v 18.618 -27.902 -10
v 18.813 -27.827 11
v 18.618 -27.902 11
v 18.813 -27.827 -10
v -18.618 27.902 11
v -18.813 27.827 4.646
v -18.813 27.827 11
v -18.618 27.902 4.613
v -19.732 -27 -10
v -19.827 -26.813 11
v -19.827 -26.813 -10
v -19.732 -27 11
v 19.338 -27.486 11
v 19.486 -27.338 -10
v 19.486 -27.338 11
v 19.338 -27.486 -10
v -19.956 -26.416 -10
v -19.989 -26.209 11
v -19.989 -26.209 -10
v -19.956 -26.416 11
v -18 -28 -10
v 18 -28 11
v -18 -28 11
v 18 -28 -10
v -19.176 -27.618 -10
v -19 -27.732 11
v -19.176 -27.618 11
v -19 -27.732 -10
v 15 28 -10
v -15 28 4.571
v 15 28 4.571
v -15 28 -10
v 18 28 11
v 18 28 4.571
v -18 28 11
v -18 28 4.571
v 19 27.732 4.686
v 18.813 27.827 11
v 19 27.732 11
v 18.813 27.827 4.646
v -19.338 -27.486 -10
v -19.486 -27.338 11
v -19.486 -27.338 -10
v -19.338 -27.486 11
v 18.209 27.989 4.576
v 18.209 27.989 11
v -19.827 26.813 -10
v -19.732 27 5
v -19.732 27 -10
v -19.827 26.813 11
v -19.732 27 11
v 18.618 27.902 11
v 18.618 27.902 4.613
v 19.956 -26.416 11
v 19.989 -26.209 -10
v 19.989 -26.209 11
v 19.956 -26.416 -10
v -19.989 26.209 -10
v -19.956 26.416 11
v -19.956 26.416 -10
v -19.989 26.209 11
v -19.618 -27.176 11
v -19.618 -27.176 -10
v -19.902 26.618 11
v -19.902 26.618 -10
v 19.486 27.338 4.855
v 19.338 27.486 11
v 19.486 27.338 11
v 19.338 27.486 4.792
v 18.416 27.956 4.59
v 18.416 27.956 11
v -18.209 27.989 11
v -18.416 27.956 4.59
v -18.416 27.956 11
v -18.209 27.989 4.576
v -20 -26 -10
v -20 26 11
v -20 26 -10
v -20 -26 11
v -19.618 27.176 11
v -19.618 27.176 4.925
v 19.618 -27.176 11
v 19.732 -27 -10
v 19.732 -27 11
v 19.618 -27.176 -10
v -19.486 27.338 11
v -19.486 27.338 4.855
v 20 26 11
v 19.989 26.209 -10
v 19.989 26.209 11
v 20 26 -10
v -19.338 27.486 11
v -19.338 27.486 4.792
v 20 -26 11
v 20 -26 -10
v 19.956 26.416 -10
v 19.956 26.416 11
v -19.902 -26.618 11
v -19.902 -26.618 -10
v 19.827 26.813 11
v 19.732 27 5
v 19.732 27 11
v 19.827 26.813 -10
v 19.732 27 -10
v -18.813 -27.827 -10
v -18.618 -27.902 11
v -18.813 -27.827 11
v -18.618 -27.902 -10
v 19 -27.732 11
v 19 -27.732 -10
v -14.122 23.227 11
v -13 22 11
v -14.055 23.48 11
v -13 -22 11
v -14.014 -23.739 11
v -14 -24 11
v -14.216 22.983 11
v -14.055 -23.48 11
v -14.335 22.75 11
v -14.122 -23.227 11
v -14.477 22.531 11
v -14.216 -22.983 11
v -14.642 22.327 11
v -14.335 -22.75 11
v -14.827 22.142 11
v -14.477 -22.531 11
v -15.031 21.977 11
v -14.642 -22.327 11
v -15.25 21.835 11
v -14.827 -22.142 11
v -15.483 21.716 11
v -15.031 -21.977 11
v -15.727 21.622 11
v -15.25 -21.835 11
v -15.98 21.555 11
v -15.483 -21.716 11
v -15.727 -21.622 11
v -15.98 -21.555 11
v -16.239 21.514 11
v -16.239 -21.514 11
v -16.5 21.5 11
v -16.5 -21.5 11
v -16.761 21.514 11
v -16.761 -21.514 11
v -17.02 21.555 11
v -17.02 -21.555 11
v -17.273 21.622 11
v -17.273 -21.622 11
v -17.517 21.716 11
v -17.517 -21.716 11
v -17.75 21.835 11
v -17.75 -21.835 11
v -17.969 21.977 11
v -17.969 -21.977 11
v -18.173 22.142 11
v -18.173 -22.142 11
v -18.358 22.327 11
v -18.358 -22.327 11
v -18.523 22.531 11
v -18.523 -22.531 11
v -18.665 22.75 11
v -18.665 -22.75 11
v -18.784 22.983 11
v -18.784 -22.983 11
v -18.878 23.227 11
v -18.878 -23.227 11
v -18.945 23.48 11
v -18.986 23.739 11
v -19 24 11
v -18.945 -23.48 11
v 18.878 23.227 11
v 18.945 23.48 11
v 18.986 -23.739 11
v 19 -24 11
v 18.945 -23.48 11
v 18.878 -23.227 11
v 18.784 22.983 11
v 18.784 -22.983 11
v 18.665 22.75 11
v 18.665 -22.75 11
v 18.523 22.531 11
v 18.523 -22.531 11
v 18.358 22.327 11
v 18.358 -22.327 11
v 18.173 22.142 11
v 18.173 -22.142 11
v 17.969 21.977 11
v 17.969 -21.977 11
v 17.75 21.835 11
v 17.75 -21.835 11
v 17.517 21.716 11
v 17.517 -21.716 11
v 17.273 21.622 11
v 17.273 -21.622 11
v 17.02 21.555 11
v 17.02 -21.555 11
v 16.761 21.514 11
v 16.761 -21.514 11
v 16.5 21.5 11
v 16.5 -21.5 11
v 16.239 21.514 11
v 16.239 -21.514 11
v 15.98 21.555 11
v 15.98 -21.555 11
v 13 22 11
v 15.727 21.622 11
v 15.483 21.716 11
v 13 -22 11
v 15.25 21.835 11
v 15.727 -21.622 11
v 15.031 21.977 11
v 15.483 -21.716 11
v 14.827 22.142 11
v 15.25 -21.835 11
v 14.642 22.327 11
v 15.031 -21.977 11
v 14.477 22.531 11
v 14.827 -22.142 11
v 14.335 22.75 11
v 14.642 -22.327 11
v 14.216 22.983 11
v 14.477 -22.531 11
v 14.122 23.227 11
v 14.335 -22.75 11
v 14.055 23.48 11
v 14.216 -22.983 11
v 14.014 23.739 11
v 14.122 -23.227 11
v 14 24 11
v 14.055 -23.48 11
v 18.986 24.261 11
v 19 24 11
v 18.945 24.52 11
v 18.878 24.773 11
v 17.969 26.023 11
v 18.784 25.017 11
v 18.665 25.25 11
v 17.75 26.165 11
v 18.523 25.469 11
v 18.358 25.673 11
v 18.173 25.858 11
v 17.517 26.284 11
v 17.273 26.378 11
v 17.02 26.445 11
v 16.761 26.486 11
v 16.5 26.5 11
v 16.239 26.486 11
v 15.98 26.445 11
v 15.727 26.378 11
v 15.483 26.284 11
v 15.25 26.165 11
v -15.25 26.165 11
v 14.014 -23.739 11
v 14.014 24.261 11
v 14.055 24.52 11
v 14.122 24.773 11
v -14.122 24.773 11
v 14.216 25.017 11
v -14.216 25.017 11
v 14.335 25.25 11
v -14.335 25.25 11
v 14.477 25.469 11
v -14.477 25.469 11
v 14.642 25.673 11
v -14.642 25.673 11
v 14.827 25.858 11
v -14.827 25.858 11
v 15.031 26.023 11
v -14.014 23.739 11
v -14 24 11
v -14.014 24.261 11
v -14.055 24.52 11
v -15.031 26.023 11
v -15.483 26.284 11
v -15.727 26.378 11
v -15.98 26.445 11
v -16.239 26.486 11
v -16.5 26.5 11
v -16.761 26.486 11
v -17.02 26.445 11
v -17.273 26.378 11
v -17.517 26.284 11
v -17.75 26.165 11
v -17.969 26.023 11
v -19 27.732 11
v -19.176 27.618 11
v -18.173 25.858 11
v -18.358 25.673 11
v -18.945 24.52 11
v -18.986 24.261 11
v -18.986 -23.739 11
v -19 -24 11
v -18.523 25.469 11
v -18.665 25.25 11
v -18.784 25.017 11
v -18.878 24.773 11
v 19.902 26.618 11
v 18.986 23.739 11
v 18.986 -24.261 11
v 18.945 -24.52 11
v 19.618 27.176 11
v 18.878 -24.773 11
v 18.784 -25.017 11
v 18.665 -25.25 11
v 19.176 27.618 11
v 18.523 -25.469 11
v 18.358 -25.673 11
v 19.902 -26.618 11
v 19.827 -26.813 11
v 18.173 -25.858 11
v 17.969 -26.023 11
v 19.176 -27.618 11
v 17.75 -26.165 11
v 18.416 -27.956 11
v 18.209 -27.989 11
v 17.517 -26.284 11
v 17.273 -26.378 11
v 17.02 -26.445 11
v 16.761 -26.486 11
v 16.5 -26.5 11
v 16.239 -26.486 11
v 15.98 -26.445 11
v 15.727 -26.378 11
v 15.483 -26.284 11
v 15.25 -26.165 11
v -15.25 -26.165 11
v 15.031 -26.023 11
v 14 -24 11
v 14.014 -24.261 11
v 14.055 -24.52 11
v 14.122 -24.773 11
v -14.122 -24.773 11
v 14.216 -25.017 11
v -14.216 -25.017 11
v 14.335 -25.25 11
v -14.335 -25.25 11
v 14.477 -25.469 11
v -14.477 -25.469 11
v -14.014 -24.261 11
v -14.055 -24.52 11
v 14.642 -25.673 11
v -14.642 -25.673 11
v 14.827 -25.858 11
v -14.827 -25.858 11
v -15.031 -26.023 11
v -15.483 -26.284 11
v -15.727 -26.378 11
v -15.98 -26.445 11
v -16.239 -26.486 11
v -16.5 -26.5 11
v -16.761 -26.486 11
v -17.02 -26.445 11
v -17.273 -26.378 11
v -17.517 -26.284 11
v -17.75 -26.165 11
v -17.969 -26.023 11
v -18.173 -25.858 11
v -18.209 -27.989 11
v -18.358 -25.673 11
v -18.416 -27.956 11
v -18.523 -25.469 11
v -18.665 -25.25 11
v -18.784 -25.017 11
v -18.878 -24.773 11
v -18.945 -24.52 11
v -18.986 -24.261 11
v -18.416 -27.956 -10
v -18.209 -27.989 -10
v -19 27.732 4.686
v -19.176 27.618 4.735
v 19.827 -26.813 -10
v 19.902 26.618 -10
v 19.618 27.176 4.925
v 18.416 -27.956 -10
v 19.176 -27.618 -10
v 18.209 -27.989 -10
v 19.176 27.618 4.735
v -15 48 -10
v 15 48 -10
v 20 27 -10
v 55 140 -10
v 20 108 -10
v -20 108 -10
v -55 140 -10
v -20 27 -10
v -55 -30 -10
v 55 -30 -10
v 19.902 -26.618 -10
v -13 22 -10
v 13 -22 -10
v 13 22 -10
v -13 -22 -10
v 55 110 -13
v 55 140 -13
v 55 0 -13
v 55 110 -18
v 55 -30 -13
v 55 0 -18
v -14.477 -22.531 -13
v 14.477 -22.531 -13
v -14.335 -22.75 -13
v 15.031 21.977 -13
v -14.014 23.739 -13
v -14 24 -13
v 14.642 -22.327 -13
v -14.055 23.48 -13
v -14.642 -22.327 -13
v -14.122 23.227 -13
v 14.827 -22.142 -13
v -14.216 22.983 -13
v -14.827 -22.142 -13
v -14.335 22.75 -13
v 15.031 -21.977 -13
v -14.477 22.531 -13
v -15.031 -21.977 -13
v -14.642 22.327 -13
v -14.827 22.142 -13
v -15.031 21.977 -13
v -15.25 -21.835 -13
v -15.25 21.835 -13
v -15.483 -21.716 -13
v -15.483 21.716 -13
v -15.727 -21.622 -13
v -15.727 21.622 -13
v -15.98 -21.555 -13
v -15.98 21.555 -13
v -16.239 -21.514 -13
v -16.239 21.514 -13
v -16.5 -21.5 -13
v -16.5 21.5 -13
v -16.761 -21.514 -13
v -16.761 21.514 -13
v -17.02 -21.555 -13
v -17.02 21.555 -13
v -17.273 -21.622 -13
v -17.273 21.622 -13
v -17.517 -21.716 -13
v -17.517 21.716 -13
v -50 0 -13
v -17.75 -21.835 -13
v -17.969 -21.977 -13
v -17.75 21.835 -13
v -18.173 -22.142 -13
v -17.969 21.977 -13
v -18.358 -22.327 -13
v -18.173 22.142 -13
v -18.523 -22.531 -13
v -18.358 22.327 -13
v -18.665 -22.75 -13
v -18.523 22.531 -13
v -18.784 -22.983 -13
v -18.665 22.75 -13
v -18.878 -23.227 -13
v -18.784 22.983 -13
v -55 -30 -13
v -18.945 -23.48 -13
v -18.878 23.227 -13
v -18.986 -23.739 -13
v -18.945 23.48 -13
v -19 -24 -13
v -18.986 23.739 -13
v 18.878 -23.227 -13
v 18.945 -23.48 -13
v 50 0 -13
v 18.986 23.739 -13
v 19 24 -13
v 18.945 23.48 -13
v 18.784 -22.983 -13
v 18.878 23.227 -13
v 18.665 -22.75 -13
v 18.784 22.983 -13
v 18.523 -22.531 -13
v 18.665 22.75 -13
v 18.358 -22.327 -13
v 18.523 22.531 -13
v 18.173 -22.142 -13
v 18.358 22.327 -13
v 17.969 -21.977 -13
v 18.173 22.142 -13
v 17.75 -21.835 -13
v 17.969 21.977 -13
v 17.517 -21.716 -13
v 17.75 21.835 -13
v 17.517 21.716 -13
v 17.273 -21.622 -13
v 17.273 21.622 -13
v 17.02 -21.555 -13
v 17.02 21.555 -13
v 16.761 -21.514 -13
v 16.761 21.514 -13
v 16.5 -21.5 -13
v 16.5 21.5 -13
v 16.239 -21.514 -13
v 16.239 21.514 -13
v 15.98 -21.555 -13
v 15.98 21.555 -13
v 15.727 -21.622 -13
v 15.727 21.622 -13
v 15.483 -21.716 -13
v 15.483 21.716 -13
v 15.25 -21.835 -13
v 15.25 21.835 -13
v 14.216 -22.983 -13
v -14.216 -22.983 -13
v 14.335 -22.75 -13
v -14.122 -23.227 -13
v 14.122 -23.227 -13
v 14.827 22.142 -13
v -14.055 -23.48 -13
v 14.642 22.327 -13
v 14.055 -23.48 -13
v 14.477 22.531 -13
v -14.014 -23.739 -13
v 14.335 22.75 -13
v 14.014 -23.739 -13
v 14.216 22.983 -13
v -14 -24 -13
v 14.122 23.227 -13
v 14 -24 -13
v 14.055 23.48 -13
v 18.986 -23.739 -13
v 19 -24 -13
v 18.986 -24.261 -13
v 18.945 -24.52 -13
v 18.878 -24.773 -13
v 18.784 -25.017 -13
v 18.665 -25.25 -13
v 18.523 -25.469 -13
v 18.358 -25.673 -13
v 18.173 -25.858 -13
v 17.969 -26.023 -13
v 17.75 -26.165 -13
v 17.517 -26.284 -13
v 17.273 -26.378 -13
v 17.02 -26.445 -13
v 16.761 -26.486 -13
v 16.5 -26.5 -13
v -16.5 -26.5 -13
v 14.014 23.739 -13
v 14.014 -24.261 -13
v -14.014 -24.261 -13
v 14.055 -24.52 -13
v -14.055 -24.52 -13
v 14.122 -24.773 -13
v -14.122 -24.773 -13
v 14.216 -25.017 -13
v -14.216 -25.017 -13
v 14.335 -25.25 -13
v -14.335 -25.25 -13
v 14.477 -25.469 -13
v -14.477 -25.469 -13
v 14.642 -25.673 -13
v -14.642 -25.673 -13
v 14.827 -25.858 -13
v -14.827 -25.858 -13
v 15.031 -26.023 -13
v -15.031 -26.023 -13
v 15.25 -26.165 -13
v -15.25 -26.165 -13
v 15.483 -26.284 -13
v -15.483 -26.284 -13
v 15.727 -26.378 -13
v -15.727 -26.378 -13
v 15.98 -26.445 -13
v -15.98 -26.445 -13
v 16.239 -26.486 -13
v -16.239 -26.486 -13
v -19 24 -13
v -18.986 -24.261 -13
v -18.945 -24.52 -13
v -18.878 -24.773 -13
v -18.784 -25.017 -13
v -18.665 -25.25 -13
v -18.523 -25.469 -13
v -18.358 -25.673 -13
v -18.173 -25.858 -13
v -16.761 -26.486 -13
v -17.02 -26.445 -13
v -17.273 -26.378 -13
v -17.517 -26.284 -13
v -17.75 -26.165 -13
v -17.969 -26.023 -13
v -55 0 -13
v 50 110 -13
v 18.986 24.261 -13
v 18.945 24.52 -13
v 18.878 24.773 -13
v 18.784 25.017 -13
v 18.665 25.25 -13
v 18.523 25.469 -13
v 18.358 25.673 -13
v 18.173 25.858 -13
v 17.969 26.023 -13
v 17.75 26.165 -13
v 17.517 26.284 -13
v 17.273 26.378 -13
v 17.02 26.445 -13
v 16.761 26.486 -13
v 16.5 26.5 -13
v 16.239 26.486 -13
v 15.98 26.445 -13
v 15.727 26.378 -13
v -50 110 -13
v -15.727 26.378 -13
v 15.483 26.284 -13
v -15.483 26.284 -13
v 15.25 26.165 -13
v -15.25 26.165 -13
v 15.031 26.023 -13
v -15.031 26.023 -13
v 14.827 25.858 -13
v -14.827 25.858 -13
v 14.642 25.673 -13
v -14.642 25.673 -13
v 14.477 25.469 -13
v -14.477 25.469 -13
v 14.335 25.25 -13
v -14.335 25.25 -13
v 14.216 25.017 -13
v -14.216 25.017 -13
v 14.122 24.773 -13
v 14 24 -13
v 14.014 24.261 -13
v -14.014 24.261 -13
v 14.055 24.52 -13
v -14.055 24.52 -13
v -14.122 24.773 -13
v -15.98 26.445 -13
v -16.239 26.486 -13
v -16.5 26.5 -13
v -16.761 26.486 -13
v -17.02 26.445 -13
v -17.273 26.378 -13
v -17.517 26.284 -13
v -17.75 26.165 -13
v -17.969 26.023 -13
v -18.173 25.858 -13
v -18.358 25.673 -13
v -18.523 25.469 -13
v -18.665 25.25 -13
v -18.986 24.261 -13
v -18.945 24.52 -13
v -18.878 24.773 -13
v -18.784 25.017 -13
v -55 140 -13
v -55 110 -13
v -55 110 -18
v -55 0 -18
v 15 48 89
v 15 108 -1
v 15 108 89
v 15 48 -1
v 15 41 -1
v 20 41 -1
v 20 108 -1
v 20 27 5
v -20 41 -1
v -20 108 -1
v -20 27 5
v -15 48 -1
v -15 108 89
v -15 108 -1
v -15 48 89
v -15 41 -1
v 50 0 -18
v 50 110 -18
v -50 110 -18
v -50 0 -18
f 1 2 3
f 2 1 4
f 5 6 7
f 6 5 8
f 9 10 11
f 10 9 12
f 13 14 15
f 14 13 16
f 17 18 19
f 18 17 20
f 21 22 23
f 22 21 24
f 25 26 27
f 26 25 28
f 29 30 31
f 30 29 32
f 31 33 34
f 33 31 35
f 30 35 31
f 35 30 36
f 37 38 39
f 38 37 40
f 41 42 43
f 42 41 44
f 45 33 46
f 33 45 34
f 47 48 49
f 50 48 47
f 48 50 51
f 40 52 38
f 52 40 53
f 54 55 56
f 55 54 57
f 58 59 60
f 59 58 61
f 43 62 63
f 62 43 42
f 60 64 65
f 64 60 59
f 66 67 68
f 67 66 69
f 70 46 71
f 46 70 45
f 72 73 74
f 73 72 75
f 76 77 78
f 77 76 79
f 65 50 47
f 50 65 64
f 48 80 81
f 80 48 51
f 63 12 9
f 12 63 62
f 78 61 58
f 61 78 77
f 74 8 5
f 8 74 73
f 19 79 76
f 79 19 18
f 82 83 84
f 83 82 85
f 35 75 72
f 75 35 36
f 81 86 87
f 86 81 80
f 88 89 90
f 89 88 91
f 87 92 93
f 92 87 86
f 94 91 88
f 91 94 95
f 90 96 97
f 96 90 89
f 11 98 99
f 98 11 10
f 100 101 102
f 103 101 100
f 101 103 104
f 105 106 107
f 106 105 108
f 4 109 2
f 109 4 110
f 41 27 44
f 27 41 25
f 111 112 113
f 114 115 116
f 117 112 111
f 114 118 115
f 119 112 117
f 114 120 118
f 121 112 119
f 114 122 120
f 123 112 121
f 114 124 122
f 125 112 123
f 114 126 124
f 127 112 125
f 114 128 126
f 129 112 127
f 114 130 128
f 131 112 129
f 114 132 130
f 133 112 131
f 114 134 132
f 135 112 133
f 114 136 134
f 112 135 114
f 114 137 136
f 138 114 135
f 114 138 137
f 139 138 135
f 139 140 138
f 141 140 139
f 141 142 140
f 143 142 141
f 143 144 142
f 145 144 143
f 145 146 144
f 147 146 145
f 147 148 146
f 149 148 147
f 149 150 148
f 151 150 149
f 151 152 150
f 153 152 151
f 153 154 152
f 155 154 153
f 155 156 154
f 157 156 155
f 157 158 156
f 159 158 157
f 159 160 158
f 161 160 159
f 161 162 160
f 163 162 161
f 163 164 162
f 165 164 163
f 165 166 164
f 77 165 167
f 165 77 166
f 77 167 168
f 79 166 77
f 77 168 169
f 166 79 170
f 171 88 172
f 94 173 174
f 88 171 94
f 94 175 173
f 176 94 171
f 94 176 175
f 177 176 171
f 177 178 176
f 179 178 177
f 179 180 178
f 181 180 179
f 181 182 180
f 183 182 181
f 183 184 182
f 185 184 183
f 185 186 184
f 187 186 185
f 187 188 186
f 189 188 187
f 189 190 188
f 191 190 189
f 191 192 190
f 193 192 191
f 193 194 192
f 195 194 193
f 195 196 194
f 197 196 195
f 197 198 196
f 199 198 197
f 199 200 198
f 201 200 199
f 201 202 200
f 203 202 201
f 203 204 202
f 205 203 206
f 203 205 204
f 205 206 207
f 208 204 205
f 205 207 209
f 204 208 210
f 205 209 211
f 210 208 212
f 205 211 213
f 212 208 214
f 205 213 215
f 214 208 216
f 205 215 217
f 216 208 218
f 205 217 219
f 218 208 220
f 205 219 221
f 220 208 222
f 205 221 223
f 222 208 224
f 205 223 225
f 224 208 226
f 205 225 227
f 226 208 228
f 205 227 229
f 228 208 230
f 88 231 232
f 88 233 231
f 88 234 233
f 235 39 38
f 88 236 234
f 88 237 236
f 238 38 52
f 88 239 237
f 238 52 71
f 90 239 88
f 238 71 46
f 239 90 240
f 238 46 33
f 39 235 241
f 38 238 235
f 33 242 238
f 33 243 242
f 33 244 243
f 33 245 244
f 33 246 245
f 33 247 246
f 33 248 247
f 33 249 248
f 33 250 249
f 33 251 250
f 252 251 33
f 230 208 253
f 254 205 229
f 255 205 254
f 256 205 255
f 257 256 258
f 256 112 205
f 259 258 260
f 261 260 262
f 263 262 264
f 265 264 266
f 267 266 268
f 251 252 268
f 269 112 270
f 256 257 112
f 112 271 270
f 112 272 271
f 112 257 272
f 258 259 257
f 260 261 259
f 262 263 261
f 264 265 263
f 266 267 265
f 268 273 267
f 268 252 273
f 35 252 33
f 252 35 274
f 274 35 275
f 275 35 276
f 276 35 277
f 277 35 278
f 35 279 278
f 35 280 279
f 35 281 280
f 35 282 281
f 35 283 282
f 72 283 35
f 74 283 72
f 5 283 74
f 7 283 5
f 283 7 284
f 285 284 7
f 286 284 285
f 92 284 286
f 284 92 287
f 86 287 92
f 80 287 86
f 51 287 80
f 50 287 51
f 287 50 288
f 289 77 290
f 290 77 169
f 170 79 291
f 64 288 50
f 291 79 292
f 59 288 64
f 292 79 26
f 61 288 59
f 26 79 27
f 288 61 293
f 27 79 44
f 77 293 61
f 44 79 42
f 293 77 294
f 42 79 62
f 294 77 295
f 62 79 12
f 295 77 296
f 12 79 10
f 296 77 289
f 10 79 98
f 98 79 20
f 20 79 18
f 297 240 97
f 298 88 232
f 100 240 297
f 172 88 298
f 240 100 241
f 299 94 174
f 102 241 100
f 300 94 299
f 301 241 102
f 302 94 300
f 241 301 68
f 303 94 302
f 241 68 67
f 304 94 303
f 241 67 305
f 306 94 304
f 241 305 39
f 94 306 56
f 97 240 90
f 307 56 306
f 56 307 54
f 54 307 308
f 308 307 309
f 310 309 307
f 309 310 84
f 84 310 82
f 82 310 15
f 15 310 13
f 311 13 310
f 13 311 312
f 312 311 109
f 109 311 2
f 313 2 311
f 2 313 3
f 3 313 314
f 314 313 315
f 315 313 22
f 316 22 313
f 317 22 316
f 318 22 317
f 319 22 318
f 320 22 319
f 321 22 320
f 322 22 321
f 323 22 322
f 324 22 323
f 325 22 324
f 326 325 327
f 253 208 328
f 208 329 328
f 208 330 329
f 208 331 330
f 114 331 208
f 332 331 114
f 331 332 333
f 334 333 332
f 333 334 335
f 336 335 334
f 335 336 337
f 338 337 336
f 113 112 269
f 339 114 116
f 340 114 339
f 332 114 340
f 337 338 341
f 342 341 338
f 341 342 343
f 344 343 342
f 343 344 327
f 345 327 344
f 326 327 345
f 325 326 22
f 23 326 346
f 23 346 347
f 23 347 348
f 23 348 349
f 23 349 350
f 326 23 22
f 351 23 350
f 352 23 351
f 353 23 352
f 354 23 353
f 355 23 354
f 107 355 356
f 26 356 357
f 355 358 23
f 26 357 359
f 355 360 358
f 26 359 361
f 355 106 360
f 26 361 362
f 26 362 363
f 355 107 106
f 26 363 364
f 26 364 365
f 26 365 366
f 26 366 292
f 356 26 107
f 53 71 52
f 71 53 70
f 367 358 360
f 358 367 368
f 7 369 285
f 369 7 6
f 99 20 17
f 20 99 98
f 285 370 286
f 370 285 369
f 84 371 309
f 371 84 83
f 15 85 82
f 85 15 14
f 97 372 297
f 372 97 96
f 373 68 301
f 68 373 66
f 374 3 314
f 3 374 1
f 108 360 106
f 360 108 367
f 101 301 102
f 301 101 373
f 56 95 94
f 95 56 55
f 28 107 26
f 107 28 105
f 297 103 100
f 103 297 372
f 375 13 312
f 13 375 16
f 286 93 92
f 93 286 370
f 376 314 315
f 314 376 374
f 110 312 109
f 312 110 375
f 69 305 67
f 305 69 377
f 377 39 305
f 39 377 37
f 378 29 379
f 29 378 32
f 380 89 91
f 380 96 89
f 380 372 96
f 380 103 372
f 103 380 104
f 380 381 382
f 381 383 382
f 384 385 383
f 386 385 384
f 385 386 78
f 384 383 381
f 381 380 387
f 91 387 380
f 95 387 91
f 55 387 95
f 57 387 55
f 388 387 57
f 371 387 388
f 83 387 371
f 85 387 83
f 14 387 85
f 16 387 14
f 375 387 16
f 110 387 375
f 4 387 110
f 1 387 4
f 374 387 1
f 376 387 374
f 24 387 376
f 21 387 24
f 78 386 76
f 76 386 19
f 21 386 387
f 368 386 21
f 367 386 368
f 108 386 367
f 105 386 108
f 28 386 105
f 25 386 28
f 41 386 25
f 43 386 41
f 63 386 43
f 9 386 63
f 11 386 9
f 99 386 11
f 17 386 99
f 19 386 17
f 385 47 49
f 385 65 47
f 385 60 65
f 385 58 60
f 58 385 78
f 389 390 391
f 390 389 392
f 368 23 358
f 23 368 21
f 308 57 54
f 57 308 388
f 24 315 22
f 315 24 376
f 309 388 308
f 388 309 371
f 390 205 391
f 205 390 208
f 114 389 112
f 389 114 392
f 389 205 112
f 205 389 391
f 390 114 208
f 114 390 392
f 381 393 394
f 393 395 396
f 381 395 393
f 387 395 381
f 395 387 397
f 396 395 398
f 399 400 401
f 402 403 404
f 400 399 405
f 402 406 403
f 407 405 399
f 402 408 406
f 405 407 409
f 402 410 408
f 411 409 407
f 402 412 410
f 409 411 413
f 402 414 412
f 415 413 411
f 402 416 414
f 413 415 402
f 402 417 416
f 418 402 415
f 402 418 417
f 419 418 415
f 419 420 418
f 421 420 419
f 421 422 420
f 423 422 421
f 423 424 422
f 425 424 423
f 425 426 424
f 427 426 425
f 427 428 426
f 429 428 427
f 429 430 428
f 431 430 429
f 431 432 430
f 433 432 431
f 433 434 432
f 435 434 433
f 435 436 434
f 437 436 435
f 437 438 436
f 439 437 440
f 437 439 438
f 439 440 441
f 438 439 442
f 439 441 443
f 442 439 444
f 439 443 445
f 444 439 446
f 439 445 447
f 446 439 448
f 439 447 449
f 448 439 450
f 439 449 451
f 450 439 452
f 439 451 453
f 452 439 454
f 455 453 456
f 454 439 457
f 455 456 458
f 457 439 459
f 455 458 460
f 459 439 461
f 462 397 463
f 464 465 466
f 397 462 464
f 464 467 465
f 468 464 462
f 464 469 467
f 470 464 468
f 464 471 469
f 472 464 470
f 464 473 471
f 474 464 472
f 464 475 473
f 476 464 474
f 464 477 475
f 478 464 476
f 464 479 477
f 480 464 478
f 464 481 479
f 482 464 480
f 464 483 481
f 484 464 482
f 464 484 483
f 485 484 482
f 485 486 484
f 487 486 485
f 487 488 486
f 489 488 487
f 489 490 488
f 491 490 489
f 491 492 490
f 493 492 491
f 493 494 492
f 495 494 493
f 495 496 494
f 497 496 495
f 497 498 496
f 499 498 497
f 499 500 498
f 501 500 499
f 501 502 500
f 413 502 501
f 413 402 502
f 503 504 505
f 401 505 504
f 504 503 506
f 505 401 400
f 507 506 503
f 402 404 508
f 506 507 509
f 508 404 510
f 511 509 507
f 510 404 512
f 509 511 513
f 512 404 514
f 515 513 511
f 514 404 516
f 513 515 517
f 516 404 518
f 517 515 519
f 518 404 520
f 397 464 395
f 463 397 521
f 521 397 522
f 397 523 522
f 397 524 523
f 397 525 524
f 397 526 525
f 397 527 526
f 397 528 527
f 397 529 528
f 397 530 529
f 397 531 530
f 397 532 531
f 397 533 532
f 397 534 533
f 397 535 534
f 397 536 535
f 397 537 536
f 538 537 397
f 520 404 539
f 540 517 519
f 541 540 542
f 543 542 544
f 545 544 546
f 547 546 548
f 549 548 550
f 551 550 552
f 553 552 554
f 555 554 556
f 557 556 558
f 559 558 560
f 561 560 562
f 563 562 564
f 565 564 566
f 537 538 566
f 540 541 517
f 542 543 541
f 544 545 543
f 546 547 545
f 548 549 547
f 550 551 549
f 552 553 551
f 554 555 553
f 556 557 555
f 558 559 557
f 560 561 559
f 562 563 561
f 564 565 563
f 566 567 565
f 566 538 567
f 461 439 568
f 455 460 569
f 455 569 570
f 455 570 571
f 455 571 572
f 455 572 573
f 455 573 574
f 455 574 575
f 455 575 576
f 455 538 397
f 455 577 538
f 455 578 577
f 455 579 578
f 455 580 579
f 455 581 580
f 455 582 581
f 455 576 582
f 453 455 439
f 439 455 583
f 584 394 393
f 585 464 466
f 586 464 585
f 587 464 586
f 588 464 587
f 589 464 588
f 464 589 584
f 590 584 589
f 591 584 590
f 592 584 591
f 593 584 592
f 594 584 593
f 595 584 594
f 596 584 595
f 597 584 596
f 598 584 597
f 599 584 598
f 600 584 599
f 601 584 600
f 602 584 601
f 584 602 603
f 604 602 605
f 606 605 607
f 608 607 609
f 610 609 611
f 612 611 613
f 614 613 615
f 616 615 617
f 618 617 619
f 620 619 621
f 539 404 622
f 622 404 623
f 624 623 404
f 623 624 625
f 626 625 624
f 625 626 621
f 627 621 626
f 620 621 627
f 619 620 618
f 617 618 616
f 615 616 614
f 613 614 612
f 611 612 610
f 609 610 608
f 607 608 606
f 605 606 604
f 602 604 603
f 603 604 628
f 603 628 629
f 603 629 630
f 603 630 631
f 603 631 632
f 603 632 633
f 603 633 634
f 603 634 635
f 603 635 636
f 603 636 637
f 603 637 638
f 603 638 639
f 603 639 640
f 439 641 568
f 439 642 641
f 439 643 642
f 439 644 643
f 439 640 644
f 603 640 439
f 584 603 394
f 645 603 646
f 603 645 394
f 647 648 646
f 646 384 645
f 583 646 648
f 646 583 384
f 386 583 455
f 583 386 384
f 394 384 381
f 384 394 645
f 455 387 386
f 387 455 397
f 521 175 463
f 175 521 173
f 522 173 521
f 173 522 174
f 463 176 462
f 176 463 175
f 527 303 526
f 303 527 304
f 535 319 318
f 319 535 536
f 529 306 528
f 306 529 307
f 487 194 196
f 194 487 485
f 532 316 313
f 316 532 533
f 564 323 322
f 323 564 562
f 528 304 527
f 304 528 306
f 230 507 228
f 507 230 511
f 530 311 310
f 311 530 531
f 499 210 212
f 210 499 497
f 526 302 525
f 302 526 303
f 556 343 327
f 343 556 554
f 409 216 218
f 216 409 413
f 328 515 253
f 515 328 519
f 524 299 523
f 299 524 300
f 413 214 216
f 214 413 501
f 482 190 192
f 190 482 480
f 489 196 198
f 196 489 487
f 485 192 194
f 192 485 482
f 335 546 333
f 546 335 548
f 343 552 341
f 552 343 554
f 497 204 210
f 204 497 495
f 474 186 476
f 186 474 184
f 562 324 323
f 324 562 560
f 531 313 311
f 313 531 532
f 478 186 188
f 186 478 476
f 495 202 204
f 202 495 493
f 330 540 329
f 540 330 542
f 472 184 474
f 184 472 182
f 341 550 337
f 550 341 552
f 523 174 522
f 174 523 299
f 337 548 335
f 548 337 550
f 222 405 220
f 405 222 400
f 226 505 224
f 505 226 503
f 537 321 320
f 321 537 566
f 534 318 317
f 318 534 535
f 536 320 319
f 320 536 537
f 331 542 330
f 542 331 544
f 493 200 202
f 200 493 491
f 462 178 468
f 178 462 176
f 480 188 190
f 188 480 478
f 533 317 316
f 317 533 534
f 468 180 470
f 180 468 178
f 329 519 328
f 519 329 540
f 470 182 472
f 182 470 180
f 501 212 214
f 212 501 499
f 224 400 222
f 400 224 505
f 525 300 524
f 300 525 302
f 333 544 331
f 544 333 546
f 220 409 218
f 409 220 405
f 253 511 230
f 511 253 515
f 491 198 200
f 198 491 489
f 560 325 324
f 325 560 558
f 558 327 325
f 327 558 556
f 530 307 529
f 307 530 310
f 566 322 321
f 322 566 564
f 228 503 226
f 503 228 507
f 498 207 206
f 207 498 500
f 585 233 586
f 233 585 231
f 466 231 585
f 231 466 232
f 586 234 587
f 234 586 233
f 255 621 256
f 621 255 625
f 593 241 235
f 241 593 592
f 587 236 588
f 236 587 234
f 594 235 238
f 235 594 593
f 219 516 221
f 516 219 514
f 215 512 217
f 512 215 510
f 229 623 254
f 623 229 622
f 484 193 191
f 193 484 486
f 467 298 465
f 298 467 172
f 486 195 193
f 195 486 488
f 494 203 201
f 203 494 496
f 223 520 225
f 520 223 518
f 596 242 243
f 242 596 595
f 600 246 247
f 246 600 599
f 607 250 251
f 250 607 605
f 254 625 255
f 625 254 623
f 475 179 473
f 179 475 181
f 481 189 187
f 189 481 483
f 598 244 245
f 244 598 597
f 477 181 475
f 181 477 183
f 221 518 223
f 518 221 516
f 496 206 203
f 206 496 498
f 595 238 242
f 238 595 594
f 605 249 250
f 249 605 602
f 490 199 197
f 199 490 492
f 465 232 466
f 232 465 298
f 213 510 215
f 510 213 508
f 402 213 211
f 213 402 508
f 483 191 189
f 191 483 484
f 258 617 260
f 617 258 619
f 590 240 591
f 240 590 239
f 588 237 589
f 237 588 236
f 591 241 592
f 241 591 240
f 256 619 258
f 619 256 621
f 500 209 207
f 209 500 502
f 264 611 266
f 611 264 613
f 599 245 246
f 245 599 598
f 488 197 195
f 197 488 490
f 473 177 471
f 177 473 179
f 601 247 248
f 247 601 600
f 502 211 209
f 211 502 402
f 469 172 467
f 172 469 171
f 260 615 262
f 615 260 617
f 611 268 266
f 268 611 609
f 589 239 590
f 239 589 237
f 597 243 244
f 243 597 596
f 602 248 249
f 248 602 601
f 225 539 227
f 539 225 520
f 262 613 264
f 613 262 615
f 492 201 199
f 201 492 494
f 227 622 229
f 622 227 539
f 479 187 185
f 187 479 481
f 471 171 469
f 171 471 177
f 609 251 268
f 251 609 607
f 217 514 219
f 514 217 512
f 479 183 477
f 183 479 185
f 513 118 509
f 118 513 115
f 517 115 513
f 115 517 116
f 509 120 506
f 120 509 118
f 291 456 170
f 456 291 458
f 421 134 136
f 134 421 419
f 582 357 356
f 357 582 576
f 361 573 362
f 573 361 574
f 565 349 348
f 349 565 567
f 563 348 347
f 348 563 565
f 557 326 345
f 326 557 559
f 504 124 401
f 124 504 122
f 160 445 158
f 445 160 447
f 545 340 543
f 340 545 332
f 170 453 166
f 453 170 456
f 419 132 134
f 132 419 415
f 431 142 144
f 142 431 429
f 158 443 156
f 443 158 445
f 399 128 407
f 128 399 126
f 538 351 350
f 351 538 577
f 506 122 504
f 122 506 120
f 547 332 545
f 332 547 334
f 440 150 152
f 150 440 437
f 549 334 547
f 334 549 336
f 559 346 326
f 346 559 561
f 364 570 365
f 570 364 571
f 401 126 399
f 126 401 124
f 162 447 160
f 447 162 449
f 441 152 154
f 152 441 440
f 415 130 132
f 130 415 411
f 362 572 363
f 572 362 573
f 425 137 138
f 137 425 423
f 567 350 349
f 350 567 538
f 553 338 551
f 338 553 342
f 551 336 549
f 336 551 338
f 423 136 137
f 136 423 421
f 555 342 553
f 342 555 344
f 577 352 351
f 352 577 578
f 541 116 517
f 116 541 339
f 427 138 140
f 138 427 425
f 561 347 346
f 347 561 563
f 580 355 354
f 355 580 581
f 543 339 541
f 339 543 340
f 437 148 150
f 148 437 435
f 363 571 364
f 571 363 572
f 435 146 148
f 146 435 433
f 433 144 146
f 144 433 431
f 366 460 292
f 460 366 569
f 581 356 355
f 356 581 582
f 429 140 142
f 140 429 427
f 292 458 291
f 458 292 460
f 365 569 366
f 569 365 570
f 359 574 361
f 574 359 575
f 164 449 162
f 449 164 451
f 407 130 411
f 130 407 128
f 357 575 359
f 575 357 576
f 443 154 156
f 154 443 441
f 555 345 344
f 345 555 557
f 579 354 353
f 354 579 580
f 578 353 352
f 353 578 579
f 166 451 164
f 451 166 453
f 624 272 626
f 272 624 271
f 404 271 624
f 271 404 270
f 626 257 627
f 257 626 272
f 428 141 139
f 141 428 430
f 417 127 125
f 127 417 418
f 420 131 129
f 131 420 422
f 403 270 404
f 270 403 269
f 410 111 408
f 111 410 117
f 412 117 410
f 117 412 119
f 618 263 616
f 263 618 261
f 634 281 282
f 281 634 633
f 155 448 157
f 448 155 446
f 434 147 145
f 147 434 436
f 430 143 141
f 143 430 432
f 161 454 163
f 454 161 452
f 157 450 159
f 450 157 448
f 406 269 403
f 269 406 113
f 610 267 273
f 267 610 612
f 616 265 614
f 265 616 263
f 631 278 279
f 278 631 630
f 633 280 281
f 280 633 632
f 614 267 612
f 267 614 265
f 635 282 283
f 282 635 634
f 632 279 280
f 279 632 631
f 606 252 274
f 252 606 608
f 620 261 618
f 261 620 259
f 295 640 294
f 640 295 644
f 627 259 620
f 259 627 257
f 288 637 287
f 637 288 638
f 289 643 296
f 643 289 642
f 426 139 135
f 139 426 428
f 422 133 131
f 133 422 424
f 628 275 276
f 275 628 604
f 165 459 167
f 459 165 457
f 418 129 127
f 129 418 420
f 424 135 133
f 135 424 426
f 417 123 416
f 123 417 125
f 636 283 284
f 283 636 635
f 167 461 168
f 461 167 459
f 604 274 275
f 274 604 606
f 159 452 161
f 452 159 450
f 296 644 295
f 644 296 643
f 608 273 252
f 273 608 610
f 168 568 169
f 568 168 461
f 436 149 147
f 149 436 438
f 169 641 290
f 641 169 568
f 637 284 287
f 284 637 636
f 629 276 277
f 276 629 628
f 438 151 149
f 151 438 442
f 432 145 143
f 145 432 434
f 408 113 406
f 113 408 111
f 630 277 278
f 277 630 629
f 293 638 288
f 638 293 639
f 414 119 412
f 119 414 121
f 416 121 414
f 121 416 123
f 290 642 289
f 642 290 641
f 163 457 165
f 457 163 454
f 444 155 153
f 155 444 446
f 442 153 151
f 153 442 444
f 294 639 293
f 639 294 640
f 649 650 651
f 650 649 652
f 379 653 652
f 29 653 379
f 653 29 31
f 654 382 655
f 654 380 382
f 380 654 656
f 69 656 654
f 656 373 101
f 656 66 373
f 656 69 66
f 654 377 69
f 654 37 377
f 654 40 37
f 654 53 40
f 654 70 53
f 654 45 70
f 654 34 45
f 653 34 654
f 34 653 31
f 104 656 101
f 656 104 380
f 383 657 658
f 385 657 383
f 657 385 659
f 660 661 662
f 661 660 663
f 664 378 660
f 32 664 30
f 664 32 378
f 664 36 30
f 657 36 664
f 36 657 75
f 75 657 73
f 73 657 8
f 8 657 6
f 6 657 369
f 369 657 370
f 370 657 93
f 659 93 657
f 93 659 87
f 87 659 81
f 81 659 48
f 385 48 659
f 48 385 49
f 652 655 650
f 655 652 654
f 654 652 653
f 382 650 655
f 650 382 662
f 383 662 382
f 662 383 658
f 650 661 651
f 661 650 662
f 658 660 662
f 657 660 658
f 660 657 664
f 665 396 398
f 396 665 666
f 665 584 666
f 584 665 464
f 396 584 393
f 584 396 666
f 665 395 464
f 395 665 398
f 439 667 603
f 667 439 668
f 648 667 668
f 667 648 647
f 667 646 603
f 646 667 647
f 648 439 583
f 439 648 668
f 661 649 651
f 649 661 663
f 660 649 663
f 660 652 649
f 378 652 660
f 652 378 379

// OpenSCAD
// file: triangle.scad
/**
 * Standard right-angled triangle
 *
 * @param number  o_len  Length of the opposite side
 * @param number  a_len  Length of the adjacent side
 * @param number  depth  How wide/deep the triangle is in the 3rd dimension
 * @param boolean center Whether to center the triangle on the origin
 * @todo a better way ?
 */
module triangle(o_len, a_len, depth, center=false)
{
    centroid = center ? [-a_len/3, -o_len/3, -depth/2] : [0, 0, 0];
    translate(centroid) linear_extrude(height=depth)
    {
        polygon(points=[[0,0],[a_len,0],[0,o_len]], paths=[[0,1,2]]);
    }
}

/**
 * Standard right-angled triangle (tangent version)
 *
 * @param number  tan_angle Angle of adjacent to hypotenuse (ie tangent)
 * @param number  a_len     Length of the adjacent side
 * @param number  depth     How wide/deep the triangle is in the 3rd dimension
 * @param boolean center    Whether to center the triangle on the origin
 */
module a_triangle(tan_angle, a_len, depth, center=false)
{
    triangle(tan(tan_angle) * a_len, a_len, depth, center);
}
// file: ruler.scad
module ruler(length)
{
    mark_width = 0.125;
    mark_depth = 0.05;

    difference()
    {
        color([1, 0, 0])
        cube( [1, length, 8 ] );
        for ( i = [1:length-1] )
        {
            translate( [mark_depth, i, 0] ) cube( [1, mark_width, 3 ] );
            translate( [-mark_depth, i, 0] ) cube( [1, mark_width, 3 ] );
            if (i % 5 == 0)
            {
                translate( [mark_depth, i, 0] ) cube( [5, mark_width, 5 ] );
                translate( [-mark_depth, i, 0] ) cube( [5, mark_width, 5 ] );
            }
            if (i % 10 == 0)
            {
                translate( [mark_depth, i, 0] ) cube( [10, mark_width, 7 ] );
                translate( [-mark_depth, i, 0] ) cube( [10, mark_width, 7 ] );
            }
        }
    }
}

//rotate([0,0,90]) ruler(200);
//translate([0, 0, 0]) cube([4, 21, 2]);
// main file
include <ruler.scad>
include <triangle.scad>

$fn=60;

module basic_outer_frame() {
  minkowski() {
    cube([40-4, 56-4, 20], true);
    cylinder(r=2,h=1); 
  }
}

module basic_inner_frame() {
  cube([26, 44, 40], true);
}

module frame() {
  difference() {
    basic_outer_frame();
    basic_inner_frame();
  }
}

module frame2() {
  frame();
  translate([-55, -30, -13]) cube([110, 170, 3]);
}

module frame_with_holes() {
  difference() {
    frame2();
    translate([16.5, -24, -14]) cylinder(d=5, h=26);
    translate([16.5, 24, -14]) cylinder(d=5, h=26);
    translate([-16.5, -24, -14]) cylinder(d=5, h=26);
    translate([-16.5, 24, -14]) cylinder(d=5, h=26);
  }
}

module support() {
    color([0, 1, 1])
    translate([15, 27, -10]) rotate([90, 0, 90]) triangle(15, 35, 5);

    color([0, 1, 0])
    translate([-20, 27, -10]) rotate([90, 0, 90]) triangle(15, 35, 5);

    translate([15, 38, -11]) cube([5, 70, 10]);
    translate([-20, 38, -11]) cube([5, 70, 10]);
}

module motor_support() {
  color([1, 0, 1])
  translate([-15, 48, -10]) cube([30, 60, 99]);
}

module upper_support() {
  color([.6, .7, .6])
  translate([50, 0, -18]) cube([5, 110, 5]);

  color([.6, .7, .6])
  translate([-55, 0, -18]) cube([5, 110, 5]);
}

module diff2 () {
  difference() {
    translate([20, 0, 0])
    cube([5,65,15]);
    c = 70;
    rotate([-75, 0, 0]) cube([c, c, c]); 
  }
}

module fixed_2_supports() {
  rotate([0, 180, 0])
  translate([15, 27, -5]) support();
  
  rotate([0, 180, 0])
  translate([-20, 27, -5]) support();
}


// *****************************************************
// main
// *****************************************************
//translate([0, -30, -10]) ruler(170);
//translate([15, 28, -10]) ruler(112);
//translate([15, 50, -10]) rotate([90, 0, 0]) ruler(30);

frame_with_holes();
support(); 
motor_support();
upper_support();
